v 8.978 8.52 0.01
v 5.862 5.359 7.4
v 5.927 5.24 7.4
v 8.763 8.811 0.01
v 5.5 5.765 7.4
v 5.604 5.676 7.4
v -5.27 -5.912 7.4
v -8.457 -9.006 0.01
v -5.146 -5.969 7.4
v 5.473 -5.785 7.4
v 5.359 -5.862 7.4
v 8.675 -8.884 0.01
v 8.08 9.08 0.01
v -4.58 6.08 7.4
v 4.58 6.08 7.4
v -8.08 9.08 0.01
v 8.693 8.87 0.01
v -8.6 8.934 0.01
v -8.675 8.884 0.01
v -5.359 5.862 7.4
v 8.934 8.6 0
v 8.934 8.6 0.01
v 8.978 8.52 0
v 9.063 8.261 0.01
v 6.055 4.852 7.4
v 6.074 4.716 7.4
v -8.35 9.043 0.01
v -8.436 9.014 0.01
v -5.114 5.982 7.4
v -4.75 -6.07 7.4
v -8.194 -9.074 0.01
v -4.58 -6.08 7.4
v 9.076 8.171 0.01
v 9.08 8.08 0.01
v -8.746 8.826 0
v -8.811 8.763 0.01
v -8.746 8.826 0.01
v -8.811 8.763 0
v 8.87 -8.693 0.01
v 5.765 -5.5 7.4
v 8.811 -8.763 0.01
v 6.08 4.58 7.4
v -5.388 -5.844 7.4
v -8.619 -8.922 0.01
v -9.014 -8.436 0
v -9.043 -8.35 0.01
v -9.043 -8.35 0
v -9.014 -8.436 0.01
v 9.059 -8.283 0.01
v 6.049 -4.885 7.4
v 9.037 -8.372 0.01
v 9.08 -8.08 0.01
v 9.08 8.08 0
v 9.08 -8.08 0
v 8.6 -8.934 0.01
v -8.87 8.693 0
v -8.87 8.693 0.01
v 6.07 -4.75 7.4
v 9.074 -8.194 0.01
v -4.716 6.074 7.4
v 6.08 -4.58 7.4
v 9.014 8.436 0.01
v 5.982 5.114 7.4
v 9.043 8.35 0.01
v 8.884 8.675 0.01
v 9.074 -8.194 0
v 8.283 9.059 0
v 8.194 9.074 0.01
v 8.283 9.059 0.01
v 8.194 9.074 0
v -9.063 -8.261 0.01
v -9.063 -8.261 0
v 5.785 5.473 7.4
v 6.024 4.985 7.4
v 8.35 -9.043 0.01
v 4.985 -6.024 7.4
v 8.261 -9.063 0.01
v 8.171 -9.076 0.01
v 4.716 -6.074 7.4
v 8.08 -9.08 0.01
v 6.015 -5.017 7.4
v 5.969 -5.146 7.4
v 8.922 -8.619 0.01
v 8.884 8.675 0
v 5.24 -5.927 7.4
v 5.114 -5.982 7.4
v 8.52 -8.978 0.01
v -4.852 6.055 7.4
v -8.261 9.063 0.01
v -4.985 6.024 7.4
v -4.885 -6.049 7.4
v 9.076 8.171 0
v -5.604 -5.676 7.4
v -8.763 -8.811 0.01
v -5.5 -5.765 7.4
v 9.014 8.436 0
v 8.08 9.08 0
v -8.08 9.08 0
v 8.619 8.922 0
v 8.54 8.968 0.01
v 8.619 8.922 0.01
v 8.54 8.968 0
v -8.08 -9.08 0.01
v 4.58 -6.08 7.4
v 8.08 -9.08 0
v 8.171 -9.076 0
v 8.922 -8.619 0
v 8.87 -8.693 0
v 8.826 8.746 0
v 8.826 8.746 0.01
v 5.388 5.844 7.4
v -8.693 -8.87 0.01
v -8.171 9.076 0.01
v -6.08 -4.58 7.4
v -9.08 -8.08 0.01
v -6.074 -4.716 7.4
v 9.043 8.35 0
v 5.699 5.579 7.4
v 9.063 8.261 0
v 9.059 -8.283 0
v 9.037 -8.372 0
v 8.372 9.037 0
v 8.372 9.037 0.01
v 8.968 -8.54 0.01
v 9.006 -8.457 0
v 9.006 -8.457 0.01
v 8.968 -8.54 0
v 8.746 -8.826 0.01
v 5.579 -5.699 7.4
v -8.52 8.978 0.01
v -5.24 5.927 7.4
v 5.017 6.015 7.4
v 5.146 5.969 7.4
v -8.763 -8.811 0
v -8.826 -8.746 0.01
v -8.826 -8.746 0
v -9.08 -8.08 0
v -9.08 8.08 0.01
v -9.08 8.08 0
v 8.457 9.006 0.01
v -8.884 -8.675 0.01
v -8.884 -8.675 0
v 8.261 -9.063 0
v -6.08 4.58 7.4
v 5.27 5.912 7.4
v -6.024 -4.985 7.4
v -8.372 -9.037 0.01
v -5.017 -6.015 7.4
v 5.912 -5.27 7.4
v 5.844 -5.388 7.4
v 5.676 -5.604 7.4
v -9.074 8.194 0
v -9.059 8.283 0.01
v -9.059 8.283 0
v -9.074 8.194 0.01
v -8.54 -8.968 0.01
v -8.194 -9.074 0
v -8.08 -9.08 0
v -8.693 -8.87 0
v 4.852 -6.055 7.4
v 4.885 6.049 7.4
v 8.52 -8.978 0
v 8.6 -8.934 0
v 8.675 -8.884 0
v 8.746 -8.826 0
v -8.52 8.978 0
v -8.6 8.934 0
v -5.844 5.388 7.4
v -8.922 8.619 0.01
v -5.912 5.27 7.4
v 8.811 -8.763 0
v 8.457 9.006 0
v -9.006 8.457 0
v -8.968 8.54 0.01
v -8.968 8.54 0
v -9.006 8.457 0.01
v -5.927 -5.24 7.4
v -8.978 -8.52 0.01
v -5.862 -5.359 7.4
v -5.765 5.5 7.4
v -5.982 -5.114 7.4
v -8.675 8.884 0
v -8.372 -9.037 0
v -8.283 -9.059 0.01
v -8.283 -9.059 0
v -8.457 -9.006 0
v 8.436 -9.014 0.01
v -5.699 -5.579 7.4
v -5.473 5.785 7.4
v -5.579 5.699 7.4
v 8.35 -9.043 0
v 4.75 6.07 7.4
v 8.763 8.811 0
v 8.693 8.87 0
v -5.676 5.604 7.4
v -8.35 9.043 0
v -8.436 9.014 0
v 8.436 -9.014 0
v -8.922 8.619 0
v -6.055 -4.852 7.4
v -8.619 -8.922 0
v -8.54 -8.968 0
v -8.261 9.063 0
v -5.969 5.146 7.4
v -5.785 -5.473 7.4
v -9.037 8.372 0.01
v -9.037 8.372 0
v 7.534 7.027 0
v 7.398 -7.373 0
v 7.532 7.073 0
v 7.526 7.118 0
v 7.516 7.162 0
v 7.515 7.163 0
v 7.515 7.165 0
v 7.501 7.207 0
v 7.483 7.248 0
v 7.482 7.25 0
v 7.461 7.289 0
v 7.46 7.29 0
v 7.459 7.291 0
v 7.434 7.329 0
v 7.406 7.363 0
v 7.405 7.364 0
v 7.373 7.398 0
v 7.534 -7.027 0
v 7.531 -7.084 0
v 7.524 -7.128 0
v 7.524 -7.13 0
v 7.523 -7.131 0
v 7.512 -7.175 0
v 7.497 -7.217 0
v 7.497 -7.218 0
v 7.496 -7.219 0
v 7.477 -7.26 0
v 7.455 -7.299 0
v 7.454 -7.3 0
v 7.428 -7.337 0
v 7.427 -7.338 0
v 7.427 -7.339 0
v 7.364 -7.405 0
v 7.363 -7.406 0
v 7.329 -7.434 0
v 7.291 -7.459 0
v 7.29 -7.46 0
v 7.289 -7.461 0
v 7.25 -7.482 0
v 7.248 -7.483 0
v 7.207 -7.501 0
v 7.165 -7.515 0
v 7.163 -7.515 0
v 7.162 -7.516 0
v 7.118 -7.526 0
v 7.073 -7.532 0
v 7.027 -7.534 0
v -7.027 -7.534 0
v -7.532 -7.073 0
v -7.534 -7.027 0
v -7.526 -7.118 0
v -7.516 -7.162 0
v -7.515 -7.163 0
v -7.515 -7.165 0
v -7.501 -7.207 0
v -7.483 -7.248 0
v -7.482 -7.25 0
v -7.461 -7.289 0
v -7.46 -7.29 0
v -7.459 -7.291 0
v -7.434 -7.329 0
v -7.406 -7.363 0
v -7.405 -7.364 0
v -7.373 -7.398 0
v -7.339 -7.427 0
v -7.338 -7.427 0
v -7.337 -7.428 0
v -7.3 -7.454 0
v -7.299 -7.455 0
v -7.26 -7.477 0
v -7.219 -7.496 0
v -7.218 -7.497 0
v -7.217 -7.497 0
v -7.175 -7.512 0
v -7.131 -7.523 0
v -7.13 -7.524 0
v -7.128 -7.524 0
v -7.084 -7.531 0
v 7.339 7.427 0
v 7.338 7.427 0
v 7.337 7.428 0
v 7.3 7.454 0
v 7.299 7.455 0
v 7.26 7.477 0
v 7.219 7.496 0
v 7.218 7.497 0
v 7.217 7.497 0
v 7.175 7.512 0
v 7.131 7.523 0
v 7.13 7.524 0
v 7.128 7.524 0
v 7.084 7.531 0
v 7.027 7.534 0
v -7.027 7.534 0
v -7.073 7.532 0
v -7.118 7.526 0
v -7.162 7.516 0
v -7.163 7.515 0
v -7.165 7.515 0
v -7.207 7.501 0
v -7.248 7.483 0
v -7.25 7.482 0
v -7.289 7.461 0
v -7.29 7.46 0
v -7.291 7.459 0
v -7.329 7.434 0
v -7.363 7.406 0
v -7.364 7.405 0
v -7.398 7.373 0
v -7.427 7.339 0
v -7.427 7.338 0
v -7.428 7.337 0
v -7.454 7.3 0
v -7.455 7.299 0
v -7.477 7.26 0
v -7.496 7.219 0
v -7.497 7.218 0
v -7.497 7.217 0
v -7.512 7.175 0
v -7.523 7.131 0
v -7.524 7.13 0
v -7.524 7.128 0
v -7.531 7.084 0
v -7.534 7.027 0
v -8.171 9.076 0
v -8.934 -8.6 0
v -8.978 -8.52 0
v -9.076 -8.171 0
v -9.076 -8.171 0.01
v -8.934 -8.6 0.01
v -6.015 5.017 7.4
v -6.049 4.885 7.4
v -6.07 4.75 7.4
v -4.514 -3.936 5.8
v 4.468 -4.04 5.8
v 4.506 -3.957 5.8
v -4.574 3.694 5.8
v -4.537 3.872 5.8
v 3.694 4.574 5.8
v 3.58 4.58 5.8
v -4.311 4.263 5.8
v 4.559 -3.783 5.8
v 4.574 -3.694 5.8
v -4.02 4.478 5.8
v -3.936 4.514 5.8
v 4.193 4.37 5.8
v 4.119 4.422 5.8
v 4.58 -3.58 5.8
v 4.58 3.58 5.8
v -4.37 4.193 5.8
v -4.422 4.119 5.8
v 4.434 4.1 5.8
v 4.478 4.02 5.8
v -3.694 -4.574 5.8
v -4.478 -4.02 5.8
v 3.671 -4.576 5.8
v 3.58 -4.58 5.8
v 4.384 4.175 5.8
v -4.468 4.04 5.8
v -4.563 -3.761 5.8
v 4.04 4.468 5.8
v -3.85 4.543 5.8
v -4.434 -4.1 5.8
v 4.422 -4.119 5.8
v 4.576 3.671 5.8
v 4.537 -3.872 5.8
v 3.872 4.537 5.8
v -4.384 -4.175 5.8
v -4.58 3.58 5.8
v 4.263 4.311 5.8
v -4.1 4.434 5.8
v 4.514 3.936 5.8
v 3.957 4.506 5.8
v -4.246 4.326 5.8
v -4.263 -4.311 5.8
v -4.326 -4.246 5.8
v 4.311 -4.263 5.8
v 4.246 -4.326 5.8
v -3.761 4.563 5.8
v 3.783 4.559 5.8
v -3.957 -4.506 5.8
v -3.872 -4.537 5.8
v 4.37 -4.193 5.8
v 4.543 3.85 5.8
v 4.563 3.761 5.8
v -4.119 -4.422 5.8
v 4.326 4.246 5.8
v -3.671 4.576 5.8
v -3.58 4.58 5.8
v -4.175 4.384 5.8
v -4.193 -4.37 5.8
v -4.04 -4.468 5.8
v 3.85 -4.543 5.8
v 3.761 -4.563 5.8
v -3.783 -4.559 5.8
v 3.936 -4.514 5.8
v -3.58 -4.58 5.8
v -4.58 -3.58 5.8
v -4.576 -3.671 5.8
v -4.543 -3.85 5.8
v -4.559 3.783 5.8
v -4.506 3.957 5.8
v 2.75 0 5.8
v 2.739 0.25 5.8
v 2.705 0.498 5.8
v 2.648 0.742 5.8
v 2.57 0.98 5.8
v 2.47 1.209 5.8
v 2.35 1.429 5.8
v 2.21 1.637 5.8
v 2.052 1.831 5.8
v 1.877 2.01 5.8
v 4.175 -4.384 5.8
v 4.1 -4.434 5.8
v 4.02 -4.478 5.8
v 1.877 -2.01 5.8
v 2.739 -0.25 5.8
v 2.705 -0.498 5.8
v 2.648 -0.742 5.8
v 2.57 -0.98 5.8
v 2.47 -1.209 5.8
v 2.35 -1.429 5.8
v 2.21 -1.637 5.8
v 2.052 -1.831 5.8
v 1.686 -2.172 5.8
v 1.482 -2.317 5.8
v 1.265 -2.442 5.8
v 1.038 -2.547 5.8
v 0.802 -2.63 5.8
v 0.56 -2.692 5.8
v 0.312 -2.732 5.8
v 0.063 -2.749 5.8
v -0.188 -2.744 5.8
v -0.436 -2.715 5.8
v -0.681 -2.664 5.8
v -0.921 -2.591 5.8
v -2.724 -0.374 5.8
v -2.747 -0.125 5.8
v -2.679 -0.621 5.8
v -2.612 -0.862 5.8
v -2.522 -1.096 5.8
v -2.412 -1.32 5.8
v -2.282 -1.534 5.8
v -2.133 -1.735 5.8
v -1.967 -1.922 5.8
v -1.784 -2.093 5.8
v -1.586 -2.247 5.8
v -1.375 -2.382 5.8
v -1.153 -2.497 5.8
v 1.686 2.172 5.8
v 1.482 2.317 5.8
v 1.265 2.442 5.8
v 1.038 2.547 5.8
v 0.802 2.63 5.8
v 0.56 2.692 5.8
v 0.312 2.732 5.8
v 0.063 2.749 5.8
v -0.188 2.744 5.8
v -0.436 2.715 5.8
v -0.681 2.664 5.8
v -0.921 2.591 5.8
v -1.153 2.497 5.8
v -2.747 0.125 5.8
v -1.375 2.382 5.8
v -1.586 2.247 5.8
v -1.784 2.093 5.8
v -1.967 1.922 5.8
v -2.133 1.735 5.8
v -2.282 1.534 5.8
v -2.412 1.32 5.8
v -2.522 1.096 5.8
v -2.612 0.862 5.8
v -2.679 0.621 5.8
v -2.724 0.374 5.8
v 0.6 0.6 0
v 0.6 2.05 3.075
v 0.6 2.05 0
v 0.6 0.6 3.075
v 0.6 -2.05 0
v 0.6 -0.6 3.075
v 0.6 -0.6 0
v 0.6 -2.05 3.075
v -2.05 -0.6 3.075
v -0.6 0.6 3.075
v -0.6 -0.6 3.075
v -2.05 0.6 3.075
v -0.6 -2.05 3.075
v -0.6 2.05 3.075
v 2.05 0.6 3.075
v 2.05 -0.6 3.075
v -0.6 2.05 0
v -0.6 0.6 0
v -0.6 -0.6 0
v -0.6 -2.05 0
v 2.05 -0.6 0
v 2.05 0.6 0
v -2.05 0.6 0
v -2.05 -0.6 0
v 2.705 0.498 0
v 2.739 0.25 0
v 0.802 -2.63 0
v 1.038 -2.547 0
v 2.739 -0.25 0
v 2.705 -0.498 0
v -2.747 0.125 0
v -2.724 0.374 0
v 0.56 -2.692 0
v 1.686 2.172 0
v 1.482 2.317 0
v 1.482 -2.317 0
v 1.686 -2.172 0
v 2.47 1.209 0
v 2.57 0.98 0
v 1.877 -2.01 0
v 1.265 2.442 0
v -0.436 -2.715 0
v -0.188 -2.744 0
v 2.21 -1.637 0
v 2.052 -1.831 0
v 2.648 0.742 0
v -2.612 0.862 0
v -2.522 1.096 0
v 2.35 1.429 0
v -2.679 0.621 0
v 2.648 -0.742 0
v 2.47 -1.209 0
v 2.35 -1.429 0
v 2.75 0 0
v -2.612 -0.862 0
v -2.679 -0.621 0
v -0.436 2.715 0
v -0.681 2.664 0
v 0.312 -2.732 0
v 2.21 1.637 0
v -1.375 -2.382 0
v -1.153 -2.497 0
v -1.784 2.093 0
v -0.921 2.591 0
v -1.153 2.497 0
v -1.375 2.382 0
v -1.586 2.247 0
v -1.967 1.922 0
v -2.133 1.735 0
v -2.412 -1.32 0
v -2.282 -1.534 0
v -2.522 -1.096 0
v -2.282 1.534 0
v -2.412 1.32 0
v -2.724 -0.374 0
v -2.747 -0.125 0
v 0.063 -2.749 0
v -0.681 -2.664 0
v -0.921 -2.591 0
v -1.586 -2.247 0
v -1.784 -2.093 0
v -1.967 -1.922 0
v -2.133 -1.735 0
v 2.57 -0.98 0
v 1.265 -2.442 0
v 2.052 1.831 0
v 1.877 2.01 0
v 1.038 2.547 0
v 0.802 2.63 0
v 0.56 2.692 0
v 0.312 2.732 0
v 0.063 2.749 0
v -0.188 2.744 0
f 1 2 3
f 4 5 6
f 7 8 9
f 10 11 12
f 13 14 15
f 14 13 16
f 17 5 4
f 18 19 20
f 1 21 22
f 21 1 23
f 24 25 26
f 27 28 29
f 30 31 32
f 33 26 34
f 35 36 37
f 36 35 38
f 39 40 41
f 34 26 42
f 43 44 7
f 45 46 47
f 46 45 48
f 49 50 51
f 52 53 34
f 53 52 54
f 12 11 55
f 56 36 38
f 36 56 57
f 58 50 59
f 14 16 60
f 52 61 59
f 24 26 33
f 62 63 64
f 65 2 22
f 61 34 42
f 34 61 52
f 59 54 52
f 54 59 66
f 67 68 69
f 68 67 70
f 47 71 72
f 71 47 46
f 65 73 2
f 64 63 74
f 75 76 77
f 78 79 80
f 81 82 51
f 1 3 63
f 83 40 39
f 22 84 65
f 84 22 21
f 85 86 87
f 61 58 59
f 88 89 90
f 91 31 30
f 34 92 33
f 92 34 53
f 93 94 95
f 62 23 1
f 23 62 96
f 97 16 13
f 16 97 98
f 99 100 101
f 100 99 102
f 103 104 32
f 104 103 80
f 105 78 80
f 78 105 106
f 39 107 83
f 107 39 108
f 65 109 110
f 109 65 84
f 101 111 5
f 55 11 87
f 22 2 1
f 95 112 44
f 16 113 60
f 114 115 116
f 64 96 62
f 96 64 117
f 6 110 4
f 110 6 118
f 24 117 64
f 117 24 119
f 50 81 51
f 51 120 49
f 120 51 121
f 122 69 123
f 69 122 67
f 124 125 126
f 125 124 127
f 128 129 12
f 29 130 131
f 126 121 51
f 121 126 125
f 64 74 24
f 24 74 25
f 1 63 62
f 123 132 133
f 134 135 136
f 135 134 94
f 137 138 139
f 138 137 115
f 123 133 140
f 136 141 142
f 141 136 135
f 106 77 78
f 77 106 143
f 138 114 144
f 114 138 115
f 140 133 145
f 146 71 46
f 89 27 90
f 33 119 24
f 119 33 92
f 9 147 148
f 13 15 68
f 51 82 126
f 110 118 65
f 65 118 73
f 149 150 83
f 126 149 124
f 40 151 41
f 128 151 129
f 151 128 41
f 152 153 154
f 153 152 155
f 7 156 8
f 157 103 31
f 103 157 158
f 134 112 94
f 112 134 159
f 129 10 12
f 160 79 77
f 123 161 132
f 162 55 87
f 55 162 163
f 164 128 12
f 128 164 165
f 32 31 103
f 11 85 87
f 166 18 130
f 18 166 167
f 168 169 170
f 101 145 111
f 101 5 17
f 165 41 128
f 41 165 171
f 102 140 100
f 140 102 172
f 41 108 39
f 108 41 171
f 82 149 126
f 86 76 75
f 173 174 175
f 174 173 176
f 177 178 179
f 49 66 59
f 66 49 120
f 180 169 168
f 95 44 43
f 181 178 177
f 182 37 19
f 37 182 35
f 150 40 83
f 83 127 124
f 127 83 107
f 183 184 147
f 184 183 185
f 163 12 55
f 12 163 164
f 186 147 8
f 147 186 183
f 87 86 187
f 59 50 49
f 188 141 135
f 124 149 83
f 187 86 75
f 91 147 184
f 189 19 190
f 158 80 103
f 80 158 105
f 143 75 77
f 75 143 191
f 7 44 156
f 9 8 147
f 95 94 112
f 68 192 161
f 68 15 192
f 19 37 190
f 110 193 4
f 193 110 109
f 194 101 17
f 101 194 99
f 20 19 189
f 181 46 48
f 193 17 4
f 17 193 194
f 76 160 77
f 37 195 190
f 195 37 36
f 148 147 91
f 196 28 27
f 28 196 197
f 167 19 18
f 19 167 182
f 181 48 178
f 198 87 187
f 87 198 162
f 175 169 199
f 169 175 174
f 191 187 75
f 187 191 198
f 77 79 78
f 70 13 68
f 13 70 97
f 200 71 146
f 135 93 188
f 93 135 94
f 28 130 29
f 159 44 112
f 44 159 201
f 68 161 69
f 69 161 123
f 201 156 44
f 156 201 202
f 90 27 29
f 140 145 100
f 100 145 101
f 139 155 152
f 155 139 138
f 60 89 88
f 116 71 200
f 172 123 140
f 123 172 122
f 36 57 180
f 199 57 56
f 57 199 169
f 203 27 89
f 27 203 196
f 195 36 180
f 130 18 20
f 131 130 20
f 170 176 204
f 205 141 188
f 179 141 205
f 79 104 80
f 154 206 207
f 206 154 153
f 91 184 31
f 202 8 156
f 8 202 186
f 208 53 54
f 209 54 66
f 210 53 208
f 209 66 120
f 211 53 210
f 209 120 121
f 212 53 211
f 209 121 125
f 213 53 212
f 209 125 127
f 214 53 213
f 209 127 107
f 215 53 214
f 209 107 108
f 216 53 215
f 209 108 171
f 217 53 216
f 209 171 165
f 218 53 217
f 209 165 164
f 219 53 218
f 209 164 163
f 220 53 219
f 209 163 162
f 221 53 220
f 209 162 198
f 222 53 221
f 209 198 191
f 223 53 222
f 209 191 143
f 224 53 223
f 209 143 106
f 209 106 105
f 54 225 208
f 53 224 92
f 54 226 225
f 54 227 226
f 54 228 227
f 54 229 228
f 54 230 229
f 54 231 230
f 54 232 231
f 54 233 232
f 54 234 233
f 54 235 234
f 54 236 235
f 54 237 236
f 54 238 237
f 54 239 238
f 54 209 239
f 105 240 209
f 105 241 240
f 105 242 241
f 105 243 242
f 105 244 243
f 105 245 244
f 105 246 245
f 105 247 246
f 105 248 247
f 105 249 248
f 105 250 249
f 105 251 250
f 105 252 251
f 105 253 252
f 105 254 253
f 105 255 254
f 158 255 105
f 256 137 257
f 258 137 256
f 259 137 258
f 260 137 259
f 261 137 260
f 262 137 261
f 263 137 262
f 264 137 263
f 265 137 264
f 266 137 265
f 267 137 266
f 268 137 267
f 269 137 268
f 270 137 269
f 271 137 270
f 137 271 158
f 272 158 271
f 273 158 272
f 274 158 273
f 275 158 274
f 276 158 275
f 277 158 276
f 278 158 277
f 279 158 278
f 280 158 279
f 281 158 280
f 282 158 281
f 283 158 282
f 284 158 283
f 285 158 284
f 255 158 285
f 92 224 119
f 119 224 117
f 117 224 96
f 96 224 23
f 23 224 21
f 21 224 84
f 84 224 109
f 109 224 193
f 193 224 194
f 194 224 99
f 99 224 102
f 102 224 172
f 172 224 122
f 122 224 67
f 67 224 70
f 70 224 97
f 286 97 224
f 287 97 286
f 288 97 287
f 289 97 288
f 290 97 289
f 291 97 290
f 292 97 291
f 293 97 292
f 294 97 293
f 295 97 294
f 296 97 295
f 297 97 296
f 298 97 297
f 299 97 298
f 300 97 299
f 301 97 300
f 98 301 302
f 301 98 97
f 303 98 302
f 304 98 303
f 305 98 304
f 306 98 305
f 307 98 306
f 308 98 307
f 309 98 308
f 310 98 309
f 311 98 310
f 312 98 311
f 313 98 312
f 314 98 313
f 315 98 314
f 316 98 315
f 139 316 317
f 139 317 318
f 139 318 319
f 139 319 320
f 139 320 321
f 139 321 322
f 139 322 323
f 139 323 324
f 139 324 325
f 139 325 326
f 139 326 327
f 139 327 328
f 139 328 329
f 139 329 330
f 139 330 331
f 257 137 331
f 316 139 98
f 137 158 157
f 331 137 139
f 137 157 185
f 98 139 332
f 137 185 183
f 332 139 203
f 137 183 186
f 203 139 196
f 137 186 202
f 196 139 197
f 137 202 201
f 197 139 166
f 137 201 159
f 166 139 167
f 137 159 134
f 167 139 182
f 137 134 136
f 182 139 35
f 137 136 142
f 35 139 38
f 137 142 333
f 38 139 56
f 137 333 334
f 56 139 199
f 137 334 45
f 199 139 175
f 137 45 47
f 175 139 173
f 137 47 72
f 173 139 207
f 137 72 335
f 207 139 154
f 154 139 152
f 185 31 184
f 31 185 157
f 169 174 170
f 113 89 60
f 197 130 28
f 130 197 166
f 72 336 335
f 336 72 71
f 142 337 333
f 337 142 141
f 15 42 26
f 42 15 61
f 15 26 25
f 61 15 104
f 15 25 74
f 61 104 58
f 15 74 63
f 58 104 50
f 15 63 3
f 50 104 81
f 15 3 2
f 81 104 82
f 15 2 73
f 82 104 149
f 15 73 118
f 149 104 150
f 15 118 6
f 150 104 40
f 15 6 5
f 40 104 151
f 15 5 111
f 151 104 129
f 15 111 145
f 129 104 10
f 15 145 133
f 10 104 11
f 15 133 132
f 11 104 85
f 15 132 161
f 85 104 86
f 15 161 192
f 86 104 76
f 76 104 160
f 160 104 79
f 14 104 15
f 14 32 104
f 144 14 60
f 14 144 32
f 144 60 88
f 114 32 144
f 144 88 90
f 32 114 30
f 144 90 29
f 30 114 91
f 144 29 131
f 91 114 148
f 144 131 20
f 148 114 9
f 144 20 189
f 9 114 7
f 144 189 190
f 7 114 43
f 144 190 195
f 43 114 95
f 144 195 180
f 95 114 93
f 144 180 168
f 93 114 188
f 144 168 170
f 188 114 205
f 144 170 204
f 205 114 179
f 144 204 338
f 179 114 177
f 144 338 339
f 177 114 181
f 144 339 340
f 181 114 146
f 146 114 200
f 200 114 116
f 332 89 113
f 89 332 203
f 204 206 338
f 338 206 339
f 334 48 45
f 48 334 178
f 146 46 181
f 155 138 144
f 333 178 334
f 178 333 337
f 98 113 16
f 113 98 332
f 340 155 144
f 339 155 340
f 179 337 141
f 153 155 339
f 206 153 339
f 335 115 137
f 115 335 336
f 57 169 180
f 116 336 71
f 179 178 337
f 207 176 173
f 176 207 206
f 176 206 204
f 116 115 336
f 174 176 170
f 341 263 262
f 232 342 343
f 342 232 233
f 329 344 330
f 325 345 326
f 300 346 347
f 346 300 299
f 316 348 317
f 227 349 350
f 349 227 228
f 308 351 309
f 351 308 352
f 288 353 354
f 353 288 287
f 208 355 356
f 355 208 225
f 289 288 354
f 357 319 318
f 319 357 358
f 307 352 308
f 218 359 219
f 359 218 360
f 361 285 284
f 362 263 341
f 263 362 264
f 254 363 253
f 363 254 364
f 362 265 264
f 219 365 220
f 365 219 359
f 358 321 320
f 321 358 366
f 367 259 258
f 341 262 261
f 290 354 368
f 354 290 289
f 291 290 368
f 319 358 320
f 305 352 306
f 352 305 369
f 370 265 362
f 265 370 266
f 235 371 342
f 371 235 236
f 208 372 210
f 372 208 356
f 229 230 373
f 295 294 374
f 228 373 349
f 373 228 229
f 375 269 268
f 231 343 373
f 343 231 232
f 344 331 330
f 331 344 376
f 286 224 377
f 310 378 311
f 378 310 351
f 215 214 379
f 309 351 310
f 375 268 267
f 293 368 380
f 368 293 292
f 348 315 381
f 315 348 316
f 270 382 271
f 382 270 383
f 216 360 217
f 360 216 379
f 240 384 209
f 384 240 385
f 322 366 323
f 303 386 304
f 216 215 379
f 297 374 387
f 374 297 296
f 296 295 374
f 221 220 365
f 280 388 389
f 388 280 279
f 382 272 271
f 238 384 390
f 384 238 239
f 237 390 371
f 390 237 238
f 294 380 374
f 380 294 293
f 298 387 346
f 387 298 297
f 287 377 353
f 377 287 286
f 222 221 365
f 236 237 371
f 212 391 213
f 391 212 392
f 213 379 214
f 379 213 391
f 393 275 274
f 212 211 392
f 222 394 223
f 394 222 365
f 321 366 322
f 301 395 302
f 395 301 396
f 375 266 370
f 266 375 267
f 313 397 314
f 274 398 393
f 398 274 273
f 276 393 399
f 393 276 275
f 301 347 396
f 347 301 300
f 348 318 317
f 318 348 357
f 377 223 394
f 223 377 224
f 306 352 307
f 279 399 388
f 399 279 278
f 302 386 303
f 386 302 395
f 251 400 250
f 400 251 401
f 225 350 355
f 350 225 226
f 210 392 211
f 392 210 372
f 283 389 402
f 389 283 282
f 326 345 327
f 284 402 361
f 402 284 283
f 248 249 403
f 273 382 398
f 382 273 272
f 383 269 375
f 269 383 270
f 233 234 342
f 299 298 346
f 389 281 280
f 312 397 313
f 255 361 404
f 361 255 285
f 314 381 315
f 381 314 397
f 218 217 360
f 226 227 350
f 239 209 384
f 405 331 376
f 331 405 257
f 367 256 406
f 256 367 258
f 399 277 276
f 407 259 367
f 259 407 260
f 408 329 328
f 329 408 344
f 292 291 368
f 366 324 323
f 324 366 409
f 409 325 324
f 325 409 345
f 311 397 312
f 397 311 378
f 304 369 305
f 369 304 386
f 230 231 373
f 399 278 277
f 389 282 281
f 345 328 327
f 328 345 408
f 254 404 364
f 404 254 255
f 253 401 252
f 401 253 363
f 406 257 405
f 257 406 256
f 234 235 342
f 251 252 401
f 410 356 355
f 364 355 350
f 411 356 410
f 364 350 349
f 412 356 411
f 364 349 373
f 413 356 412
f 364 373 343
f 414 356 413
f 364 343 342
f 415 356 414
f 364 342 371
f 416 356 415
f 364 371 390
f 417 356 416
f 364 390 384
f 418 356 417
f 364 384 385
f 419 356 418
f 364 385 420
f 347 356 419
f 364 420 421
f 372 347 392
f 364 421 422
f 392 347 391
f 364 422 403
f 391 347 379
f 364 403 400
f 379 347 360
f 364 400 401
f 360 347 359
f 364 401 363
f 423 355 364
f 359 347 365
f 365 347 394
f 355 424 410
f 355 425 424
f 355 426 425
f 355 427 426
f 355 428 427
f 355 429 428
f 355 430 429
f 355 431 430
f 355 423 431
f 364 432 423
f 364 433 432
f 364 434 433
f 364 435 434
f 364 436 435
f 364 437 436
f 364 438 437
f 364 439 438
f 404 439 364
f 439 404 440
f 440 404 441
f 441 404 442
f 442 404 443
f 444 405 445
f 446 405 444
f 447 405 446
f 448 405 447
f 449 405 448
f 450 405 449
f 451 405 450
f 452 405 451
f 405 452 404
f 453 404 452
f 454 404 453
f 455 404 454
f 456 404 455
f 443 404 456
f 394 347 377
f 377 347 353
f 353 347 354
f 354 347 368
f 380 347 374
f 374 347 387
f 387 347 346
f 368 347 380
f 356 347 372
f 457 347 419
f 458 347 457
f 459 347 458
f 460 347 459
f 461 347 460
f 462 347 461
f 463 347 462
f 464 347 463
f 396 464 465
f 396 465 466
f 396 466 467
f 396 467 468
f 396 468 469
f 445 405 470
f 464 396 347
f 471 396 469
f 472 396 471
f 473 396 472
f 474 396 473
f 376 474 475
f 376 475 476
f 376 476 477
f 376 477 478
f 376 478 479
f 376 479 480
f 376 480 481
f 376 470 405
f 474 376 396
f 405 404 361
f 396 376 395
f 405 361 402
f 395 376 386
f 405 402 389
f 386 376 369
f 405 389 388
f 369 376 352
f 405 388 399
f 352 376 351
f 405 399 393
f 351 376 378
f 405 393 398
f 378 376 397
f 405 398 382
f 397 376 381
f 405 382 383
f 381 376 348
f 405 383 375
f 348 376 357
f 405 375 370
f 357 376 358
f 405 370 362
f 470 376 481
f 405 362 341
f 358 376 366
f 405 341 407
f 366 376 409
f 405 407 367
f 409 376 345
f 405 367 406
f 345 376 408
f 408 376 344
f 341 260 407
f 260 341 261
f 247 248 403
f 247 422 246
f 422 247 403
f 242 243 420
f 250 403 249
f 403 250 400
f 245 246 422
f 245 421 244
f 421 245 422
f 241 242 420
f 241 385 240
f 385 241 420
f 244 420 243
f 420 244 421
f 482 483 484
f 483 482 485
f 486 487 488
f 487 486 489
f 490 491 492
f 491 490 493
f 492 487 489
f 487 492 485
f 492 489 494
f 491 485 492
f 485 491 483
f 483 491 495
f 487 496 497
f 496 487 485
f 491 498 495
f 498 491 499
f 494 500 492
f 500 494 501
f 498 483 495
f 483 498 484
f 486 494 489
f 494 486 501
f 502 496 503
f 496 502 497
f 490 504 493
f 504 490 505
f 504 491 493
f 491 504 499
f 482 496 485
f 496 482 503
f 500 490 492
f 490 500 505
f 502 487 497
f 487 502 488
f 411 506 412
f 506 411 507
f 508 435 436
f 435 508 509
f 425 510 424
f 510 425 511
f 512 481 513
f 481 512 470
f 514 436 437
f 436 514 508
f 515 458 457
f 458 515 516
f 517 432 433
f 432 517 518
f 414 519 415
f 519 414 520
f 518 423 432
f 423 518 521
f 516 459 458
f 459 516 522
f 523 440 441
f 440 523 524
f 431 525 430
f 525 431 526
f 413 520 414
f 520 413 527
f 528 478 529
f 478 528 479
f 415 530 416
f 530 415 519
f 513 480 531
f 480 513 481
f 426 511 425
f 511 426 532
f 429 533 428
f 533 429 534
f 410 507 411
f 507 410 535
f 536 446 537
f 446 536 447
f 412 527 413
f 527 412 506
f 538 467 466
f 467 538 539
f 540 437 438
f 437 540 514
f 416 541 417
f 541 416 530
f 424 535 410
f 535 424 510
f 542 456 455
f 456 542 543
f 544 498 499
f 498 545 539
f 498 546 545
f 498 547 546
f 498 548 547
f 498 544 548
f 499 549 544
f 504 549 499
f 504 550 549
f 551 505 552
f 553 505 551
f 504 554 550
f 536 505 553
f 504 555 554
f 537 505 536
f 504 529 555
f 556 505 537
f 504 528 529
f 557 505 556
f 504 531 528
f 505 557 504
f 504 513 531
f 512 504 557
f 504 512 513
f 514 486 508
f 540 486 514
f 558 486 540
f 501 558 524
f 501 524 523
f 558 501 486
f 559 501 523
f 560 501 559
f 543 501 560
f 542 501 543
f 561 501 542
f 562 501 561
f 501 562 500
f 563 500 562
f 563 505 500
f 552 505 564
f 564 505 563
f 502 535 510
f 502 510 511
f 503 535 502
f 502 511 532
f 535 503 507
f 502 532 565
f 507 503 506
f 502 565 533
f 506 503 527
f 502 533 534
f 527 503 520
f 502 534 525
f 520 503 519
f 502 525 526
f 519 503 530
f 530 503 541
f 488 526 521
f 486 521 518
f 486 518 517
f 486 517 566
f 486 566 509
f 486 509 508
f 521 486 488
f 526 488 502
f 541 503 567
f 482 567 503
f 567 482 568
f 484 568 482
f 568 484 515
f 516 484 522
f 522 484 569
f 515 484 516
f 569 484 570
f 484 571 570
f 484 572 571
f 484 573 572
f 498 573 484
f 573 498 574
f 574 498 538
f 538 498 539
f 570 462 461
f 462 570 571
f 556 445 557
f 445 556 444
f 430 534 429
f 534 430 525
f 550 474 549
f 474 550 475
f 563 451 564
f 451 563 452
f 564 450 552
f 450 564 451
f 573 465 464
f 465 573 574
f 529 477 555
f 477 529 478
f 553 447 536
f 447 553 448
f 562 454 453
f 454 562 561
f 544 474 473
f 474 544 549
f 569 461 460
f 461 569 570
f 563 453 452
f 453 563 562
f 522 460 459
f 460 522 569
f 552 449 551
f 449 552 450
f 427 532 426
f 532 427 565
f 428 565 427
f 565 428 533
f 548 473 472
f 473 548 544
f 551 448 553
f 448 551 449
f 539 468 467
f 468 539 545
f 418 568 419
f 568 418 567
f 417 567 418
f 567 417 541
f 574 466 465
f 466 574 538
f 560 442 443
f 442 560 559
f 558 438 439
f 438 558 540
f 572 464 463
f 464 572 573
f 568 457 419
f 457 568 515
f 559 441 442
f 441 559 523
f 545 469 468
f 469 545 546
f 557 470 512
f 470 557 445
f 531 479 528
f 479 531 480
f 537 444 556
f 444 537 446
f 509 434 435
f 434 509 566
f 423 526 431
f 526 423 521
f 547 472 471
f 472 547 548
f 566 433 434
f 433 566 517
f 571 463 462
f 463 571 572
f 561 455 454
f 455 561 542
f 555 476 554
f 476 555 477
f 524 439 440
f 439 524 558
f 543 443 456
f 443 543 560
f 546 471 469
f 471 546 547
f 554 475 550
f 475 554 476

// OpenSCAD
/*
 * Fidget Toy DSA Keycap Generator
 * Based on KeyV2 library principles by rsheldiii
 * Optimized for fidget toy use (no actual switch stem needed)
 *
 * DSA Profile: Uniform height (~7.39mm), spherical dish, no sculpting
 * Perfect for fidget toys due to its consistent feel across all keys
 *
 * Author: Generated for Moikas (moikas.com)
 * License: GPL-3.0 (same as KeyV2)
 */

/* [Basic Key Settings] */
// Key unit width (1 = standard key, 1.25 = ctrl/alt, 1.5 = tab, etc)
key_units = 1; // [0.5:0.25:6.25]

// Key unit height (usually 1 for most keys)
key_units_height = 1; // [0.5:0.25:2]

// Standard key spacing in mm (19.05mm is standard Cherry MX spacing)
unit_size = 19.05;

/* [DSA Profile Dimensions] */
// Base width/height for 1u key (18.16mm standard)
base_width = 18.16;
base_height = 18.16;

// Top width difference from base (how much smaller top is)
top_width_diff = 6;
top_height_diff = 6;

// Total keycap height (DSA standard is ~7.39mm)
total_depth = 7.39;

// Wall thickness (1.5mm each side = 3mm total)
wall_thickness = 1.5;

/* [Dish Settings] */
// Dish type: "spherical" for DSA, "cylindrical" for other profiles
dish_type = "flat"; // [spherical, cylindrical, flat]

// Dish depth (how deep the concave top is)
dish_depth = 1;

// Dish radius for spherical dish
dish_radius = 22;

/* [Stem Settings - For Fidget Toys] */
// Enable stem (turn off for flat-bottom fidget pieces)
enable_stem = true;

// Cherry MX stem
stem_type = "cherry"; // [cherry, alps, choc, none]

// Stem slop/tolerance (increase if too tight, 0.3 is good for FDM)
stem_slop = 0.1;

// Stem inset from bottom of keycap
stem_inset = 0;

/* [Fidget Toy Options] */
// Add a solid base instead of hollow (good for fidget toys)
solid_base = false;

// Base thickness when solid_base is enabled
solid_base_thickness = 2;

// Add texture to top (for tactile fidgeting)
add_texture = false;

// Texture type
texture_type = "dots"; // [dots, lines, grid]

/* [Legend/Text Settings] */
// Add text to keycap
enable_legend = false;

// Legend text
legend_text = "F";

// Legend font size
legend_size = 5;

// Legend font
legend_font = "Arial:style=Bold";

// Legend depth (negative = inset, positive = raised)
legend_depth = -0.5;

/* [Rendering Quality] */
$fn = 69; // Smoothness (increase for final render, decrease for preview)

/* ==================== MODULES ==================== */

// Calculate actual dimensions based on unit size
function actual_width() = base_width + (key_units - 1) * unit_size;
function actual_height() = base_height + (key_units_height - 1) * unit_size;

// DSA Profile - spherical top with uniform shape
module dsa_keycap_shape() {
    bottom_width = actual_width();
    bottom_height = actual_height();
    top_width = bottom_width - top_width_diff;
    top_height = bottom_height - top_height_diff;

    // Create the basic keycap shell using hull between bottom and top
    difference() {
        // Outer shell
        hull() {
            // Bottom rounded rectangle
            linear_extrude(height=0.01)
                offset(r=1)
                    square([bottom_width-2, bottom_height-2], center=true);

            // Top rounded rectangle (smaller, elevated)
            translate([0, 0, total_depth])
                linear_extrude(height=0.01)
                    offset(r=1.5)
                        square([top_width-3, top_height-3], center=true);
        }

        // Hollow out the inside (unless solid base)
        if (!solid_base) {
            translate([0, 0, -0.1])
            hull() {
                // Bottom inner
                linear_extrude(height=0.01)
                    offset(r=0.5)
                        square([bottom_width - wall_thickness*2 - 1,
                                bottom_height - wall_thickness*2 - 1], center=true);

                // Top inner (follows outer taper)
                translate([0, 0, total_depth - wall_thickness])
                    linear_extrude(height=0.01)
                        offset(r=1)
                            square([top_width - wall_thickness*2 - 2,
                                    top_height - wall_thickness*2 - 2], center=true);
            }
        } else {
            // For solid base, only hollow out above the base thickness
            translate([0, 0, solid_base_thickness])
            hull() {
                linear_extrude(height=0.01)
                    offset(r=0.5)
                        square([bottom_width - wall_thickness*2 - 1,
                                bottom_height - wall_thickness*2 - 1], center=true);

                translate([0, 0, total_depth - solid_base_thickness - wall_thickness])
                    linear_extrude(height=0.01)
                        offset(r=1)
                            square([top_width - wall_thickness*2 - 2,
                                    top_height - wall_thickness*2 - 2], center=true);
            }
        }

        // Dish (spherical cutout on top)
        if (dish_type == "spherical") {
            translate([0, 0, total_depth + dish_radius - dish_depth])
                sphere(r=dish_radius);
        } else if (dish_type == "cylindrical") {
            translate([0, 0, total_depth + dish_radius - dish_depth])
                rotate([90, 0, 0])
                    cylinder(h=bottom_height*2, r=dish_radius, center=true);
        }
        // "flat" = no dish cutout

        // Legend cutout (if enabled and inset)
        if (enable_legend && legend_depth < 0) {
            translate([0, 0, total_depth - abs(legend_depth) + 0.5])
                linear_extrude(height=abs(legend_depth) + 1)
                    text(legend_text, size=legend_size, font=legend_font,
                         halign="center", valign="center");
        }
    }

    // Raised legend (if enabled and positive depth)
    if (enable_legend && legend_depth > 0) {
        translate([0, 0, total_depth - dish_depth/2])
            linear_extrude(height=legend_depth)
                text(legend_text, size=legend_size, font=legend_font,
                     halign="center", valign="center");
    }

    // Add texture if enabled
    if (add_texture) {
        add_top_texture();
    }
}

// Cherry MX stem (cross-shaped)
module cherry_stem() {
    stem_height = 6.15; // Standard Cherry MX stem height
    cross_length = 4.0 + stem_slop;
    cross_width = 1.1 + stem_slop;
    outer_diameter = 5.5;

    difference() {
        // Outer cylinder
        cylinder(h=stem_height, d=outer_diameter, center=false);

        // Cross cutout
        translate([0, 0, -0.1]) {
            // Vertical part of cross
            cube([cross_width, cross_length, stem_height + 0.2], center=true);
            // Horizontal part of cross
            cube([cross_length, cross_width, stem_height + 0.2], center=true);
        }
    }
}

// Alps stem (rectangle)
module alps_stem() {
    stem_height = 4;
    alps_width = 4.45 + stem_slop;
    alps_length = 2.25 + stem_slop;

    difference() {
        cylinder(h=stem_height, d=6, center=false);
        translate([0, 0, -0.1])
            cube([alps_width, alps_length, stem_height + 0.2], center=true);
    }
}

// Kailh Choc stem (two small posts)
module choc_stem() {
    stem_height = 3;
    post_diameter = 1.2 + stem_slop;
    post_spacing = 5.7;

    translate([-post_spacing/2, 0, 0])
        cylinder(h=stem_height, d=3, center=false);
    translate([post_spacing/2, 0, 0])
        cylinder(h=stem_height, d=3, center=false);
}

// Texture patterns for fidget toys
module add_top_texture() {
    top_width = actual_width() - top_width_diff;
    top_height = actual_height() - top_height_diff;

    if (texture_type == "dots") {
        // Grid of small raised dots
        dot_spacing = 2;
        dot_radius = 0.3;
        dot_height = 0.2;

        for (x = [-top_width/3 : dot_spacing : top_width/3]) {
            for (y = [-top_height/3 : dot_spacing : top_height/3]) {
                translate([x, y, total_depth - dish_depth/2])
                    sphere(r=dot_radius);
            }
        }
    } else if (texture_type == "lines") {
        // Parallel ridges
        line_spacing = 1.5;
        line_width = 0.3;
        line_height = 0.2;

        for (y = [-top_height/3 : line_spacing : top_height/3]) {
            translate([0, y, total_depth - dish_depth/2])
                cube([top_width*0.6, line_width, line_height], center=true);
        }
    } else if (texture_type == "grid") {
        // Crosshatch pattern
        grid_spacing = 2;
        line_width = 0.3;
        line_height = 0.15;

        for (x = [-top_width/3 : grid_spacing : top_width/3]) {
            translate([x, 0, total_depth - dish_depth/2])
                cube([line_width, top_height*0.6, line_height], center=true);
        }
        for (y = [-top_height/3 : grid_spacing : top_height/3]) {
            translate([0, y, total_depth - dish_depth/2])
                cube([top_width*0.6, line_width, line_height], center=true);
        }
    }
}

// Support brim for better FDM printing
module stem_brim() {
    brim_radius = 8;
    brim_height = 0.4;

    cylinder(h=brim_height, r=brim_radius, center=false);
}

/* ==================== MAIN KEYCAP ASSEMBLY ==================== */

module fidget_dsa_keycap() {
    union() {
        // Main keycap body
        dsa_keycap_shape();

        // Stem
        if (enable_stem) {
            translate([0, 0, stem_inset]) {
                if (stem_type == "cherry") {
                    cherry_stem();
                } else if (stem_type == "alps") {
                    alps_stem();
                } else if (stem_type == "choc") {
                    choc_stem();
                }
            }
        }
    }
}

// Generate the keycap!
fidget_dsa_keycap();

/* ==================== EXAMPLES ==================== */
// Uncomment any of these to see different configurations:

// Standard 1u DSA key:
// key_units = 1; fidget_dsa_keycap();

// Spacebar (6.25u):
// key_units = 6.25; fidget_dsa_keycap();

// 2u key with stabilizers would need additional stems at ±12mm

// Row of different sized keys:
/*
for (i = [0:4]) {
    translate([i * 20, 0, 0]) {
        key_units = 1 + i * 0.25;
        fidget_dsa_keycap();
    }
}
*/

// Fidget toy set without stems (flat bottom for gluing/pressing):
/*
enable_stem = false;
solid_base = true;
solid_base_thickness = 3;
add_texture = true;
texture_type = "dots";
fidget_dsa_keycap();
*/
